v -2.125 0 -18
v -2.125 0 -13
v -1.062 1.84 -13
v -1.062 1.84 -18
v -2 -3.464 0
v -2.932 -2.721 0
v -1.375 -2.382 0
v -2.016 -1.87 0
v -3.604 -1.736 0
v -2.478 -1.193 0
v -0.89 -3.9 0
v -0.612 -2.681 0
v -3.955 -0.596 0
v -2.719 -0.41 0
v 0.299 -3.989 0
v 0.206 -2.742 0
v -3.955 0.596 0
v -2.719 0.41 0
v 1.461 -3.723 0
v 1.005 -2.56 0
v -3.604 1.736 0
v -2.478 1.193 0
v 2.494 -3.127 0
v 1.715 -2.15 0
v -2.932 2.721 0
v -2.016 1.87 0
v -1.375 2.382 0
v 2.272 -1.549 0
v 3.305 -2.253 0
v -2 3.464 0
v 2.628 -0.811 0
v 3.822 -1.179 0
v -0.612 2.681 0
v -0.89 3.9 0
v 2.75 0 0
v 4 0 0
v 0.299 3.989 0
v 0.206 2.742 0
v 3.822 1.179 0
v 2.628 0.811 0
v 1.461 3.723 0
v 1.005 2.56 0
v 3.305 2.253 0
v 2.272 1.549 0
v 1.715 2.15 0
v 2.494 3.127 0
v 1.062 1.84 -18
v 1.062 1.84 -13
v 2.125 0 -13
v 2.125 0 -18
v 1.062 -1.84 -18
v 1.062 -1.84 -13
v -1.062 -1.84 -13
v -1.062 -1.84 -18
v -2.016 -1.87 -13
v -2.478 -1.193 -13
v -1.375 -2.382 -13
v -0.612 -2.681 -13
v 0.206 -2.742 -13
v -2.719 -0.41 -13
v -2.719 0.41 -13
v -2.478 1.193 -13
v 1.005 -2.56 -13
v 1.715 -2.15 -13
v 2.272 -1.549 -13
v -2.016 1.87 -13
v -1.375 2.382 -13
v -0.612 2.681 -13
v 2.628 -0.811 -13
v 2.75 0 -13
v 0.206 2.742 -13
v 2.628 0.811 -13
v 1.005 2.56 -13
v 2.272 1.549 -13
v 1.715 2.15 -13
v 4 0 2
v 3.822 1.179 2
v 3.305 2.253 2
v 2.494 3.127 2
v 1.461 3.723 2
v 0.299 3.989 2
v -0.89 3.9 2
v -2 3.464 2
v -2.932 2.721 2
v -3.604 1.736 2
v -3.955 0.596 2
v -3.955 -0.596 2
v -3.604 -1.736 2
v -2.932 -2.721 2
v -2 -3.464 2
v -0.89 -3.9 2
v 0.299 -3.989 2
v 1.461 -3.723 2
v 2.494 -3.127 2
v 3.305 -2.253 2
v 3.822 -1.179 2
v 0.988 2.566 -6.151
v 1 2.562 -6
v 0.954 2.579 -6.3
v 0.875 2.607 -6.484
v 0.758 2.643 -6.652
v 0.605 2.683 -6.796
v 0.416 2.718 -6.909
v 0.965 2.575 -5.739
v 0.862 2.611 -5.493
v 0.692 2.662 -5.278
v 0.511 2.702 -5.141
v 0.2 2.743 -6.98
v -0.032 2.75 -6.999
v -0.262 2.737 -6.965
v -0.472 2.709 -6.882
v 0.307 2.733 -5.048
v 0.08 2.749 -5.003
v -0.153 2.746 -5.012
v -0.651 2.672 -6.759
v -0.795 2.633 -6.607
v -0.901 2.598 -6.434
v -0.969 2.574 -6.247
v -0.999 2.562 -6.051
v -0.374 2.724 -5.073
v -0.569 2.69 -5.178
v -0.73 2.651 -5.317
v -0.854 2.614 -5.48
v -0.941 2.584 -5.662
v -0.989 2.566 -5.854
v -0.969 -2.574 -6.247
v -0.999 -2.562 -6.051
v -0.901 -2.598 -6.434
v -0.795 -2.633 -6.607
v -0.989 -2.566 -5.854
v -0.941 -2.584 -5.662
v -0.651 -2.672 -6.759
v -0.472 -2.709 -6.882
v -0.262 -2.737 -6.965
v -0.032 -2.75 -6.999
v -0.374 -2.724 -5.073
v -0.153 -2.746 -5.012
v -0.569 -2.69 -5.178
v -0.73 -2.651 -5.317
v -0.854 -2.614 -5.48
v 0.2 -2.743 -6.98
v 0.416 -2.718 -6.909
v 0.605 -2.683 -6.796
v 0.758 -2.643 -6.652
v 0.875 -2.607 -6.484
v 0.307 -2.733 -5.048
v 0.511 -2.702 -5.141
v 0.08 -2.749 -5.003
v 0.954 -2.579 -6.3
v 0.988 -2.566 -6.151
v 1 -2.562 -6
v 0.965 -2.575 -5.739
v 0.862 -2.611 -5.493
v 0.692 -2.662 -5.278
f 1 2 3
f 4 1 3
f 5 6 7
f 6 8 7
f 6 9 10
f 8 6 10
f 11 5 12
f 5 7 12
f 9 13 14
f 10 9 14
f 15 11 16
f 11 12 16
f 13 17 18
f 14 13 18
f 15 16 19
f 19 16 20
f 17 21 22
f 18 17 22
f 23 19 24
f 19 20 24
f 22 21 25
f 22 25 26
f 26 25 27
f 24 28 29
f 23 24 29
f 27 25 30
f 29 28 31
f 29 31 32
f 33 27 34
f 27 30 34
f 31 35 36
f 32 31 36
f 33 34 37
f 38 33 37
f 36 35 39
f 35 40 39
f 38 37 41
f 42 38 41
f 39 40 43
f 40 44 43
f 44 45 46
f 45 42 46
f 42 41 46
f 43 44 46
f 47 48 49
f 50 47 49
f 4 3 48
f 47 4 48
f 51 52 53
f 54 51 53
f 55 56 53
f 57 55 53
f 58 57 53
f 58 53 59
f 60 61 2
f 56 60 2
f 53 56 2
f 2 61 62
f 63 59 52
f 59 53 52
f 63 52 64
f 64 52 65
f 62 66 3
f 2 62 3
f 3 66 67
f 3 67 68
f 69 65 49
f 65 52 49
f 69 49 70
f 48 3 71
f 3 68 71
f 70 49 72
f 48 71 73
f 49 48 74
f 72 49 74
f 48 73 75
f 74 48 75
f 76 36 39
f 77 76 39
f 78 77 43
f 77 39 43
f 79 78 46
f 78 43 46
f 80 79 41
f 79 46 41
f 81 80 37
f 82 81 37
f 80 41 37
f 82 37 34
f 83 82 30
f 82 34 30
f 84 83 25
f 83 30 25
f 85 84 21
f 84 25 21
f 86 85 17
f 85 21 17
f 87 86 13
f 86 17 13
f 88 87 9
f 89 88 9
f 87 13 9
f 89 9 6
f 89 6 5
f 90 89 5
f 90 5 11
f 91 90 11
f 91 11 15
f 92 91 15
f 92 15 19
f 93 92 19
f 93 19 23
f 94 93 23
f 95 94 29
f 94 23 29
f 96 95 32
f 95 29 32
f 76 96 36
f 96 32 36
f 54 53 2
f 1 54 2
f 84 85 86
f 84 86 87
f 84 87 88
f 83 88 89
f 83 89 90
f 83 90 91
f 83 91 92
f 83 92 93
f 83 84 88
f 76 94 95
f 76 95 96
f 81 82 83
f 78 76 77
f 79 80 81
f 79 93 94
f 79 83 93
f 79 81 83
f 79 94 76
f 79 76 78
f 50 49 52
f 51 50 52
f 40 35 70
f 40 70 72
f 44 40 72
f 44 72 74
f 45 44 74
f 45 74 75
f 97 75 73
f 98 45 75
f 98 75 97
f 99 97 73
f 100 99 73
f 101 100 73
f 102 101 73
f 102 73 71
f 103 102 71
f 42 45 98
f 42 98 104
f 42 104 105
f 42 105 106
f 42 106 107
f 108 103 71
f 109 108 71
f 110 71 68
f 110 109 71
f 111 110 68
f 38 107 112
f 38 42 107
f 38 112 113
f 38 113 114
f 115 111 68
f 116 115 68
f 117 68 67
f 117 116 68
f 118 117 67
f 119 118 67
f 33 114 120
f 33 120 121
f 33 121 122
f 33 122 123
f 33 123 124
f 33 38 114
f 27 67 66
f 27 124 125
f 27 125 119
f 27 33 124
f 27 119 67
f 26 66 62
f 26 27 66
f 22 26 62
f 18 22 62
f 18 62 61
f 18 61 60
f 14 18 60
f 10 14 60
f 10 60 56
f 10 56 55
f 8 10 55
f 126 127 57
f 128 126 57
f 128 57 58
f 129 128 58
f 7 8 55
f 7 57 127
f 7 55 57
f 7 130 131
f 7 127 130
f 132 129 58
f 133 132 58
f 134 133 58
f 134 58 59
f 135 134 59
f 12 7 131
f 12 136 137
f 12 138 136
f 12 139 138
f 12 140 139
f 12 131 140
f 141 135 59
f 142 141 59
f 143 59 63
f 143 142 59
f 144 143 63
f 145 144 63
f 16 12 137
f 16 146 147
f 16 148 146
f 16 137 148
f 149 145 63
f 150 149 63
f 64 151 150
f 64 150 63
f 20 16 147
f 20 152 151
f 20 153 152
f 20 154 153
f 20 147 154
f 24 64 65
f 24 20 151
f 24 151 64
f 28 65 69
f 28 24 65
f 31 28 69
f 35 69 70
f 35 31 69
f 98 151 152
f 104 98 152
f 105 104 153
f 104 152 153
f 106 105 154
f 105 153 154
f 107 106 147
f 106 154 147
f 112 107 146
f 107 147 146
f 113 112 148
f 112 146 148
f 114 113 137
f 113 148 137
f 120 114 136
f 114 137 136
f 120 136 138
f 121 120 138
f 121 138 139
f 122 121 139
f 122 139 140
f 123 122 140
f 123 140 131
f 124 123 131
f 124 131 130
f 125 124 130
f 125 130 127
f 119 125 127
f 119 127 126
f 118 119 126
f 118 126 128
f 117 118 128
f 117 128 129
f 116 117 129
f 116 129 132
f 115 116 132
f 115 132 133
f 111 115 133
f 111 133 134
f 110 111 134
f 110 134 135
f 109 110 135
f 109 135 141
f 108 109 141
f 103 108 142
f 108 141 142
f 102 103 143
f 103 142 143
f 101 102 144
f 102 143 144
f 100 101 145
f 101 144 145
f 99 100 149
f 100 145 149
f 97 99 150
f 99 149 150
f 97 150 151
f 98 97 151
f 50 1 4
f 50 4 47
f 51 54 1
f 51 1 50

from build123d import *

# Parameters (mm, degrees)
F0_R     = 4
F0_R_2   = 2.75
F1_DEPTH = 2
F2_DEPTH = 13
F4_DEPTH = 5
F8_R     = 1
F9_DEPTH = 45


with BuildPart() as f1:
    # F0 (on Top) → F1 (new body)
    with BuildSketch(Plane.XY):
        Circle(F0_R)
        Circle(F0_R_2, mode=Mode.SUBTRACT)
        Circle(F0_R_2)
    extrude(amount=F1_DEPTH)

    # F0 (on Top) → F2 (join)
    with BuildSketch(Plane.XY):
        Circle(F0_R_2)
    extrude(amount=-F2_DEPTH)

    # F3 (on face) → F4 (join)
    with BuildSketch(Plane(origin=(0, 0, -13), x_dir=(1, 0, 0), z_dir=(0, 0, -1))):
        Polygon((1.0625, -1.840304), (2.125, 0), (1.0625, 1.840304), (-1.0625, 1.840304), (-2.125, 0), (-1.0625, -1.840304), align=None)
    extrude(amount=F4_DEPTH)

    # F8 (on offset) → F9 (cut)
    with BuildSketch(Plane.XZ.offset(25)):
        with Locations((0, -6)):
            Circle(F8_R)
    extrude(amount=-F9_DEPTH, mode=Mode.SUBTRACT)


solid = f1.part
